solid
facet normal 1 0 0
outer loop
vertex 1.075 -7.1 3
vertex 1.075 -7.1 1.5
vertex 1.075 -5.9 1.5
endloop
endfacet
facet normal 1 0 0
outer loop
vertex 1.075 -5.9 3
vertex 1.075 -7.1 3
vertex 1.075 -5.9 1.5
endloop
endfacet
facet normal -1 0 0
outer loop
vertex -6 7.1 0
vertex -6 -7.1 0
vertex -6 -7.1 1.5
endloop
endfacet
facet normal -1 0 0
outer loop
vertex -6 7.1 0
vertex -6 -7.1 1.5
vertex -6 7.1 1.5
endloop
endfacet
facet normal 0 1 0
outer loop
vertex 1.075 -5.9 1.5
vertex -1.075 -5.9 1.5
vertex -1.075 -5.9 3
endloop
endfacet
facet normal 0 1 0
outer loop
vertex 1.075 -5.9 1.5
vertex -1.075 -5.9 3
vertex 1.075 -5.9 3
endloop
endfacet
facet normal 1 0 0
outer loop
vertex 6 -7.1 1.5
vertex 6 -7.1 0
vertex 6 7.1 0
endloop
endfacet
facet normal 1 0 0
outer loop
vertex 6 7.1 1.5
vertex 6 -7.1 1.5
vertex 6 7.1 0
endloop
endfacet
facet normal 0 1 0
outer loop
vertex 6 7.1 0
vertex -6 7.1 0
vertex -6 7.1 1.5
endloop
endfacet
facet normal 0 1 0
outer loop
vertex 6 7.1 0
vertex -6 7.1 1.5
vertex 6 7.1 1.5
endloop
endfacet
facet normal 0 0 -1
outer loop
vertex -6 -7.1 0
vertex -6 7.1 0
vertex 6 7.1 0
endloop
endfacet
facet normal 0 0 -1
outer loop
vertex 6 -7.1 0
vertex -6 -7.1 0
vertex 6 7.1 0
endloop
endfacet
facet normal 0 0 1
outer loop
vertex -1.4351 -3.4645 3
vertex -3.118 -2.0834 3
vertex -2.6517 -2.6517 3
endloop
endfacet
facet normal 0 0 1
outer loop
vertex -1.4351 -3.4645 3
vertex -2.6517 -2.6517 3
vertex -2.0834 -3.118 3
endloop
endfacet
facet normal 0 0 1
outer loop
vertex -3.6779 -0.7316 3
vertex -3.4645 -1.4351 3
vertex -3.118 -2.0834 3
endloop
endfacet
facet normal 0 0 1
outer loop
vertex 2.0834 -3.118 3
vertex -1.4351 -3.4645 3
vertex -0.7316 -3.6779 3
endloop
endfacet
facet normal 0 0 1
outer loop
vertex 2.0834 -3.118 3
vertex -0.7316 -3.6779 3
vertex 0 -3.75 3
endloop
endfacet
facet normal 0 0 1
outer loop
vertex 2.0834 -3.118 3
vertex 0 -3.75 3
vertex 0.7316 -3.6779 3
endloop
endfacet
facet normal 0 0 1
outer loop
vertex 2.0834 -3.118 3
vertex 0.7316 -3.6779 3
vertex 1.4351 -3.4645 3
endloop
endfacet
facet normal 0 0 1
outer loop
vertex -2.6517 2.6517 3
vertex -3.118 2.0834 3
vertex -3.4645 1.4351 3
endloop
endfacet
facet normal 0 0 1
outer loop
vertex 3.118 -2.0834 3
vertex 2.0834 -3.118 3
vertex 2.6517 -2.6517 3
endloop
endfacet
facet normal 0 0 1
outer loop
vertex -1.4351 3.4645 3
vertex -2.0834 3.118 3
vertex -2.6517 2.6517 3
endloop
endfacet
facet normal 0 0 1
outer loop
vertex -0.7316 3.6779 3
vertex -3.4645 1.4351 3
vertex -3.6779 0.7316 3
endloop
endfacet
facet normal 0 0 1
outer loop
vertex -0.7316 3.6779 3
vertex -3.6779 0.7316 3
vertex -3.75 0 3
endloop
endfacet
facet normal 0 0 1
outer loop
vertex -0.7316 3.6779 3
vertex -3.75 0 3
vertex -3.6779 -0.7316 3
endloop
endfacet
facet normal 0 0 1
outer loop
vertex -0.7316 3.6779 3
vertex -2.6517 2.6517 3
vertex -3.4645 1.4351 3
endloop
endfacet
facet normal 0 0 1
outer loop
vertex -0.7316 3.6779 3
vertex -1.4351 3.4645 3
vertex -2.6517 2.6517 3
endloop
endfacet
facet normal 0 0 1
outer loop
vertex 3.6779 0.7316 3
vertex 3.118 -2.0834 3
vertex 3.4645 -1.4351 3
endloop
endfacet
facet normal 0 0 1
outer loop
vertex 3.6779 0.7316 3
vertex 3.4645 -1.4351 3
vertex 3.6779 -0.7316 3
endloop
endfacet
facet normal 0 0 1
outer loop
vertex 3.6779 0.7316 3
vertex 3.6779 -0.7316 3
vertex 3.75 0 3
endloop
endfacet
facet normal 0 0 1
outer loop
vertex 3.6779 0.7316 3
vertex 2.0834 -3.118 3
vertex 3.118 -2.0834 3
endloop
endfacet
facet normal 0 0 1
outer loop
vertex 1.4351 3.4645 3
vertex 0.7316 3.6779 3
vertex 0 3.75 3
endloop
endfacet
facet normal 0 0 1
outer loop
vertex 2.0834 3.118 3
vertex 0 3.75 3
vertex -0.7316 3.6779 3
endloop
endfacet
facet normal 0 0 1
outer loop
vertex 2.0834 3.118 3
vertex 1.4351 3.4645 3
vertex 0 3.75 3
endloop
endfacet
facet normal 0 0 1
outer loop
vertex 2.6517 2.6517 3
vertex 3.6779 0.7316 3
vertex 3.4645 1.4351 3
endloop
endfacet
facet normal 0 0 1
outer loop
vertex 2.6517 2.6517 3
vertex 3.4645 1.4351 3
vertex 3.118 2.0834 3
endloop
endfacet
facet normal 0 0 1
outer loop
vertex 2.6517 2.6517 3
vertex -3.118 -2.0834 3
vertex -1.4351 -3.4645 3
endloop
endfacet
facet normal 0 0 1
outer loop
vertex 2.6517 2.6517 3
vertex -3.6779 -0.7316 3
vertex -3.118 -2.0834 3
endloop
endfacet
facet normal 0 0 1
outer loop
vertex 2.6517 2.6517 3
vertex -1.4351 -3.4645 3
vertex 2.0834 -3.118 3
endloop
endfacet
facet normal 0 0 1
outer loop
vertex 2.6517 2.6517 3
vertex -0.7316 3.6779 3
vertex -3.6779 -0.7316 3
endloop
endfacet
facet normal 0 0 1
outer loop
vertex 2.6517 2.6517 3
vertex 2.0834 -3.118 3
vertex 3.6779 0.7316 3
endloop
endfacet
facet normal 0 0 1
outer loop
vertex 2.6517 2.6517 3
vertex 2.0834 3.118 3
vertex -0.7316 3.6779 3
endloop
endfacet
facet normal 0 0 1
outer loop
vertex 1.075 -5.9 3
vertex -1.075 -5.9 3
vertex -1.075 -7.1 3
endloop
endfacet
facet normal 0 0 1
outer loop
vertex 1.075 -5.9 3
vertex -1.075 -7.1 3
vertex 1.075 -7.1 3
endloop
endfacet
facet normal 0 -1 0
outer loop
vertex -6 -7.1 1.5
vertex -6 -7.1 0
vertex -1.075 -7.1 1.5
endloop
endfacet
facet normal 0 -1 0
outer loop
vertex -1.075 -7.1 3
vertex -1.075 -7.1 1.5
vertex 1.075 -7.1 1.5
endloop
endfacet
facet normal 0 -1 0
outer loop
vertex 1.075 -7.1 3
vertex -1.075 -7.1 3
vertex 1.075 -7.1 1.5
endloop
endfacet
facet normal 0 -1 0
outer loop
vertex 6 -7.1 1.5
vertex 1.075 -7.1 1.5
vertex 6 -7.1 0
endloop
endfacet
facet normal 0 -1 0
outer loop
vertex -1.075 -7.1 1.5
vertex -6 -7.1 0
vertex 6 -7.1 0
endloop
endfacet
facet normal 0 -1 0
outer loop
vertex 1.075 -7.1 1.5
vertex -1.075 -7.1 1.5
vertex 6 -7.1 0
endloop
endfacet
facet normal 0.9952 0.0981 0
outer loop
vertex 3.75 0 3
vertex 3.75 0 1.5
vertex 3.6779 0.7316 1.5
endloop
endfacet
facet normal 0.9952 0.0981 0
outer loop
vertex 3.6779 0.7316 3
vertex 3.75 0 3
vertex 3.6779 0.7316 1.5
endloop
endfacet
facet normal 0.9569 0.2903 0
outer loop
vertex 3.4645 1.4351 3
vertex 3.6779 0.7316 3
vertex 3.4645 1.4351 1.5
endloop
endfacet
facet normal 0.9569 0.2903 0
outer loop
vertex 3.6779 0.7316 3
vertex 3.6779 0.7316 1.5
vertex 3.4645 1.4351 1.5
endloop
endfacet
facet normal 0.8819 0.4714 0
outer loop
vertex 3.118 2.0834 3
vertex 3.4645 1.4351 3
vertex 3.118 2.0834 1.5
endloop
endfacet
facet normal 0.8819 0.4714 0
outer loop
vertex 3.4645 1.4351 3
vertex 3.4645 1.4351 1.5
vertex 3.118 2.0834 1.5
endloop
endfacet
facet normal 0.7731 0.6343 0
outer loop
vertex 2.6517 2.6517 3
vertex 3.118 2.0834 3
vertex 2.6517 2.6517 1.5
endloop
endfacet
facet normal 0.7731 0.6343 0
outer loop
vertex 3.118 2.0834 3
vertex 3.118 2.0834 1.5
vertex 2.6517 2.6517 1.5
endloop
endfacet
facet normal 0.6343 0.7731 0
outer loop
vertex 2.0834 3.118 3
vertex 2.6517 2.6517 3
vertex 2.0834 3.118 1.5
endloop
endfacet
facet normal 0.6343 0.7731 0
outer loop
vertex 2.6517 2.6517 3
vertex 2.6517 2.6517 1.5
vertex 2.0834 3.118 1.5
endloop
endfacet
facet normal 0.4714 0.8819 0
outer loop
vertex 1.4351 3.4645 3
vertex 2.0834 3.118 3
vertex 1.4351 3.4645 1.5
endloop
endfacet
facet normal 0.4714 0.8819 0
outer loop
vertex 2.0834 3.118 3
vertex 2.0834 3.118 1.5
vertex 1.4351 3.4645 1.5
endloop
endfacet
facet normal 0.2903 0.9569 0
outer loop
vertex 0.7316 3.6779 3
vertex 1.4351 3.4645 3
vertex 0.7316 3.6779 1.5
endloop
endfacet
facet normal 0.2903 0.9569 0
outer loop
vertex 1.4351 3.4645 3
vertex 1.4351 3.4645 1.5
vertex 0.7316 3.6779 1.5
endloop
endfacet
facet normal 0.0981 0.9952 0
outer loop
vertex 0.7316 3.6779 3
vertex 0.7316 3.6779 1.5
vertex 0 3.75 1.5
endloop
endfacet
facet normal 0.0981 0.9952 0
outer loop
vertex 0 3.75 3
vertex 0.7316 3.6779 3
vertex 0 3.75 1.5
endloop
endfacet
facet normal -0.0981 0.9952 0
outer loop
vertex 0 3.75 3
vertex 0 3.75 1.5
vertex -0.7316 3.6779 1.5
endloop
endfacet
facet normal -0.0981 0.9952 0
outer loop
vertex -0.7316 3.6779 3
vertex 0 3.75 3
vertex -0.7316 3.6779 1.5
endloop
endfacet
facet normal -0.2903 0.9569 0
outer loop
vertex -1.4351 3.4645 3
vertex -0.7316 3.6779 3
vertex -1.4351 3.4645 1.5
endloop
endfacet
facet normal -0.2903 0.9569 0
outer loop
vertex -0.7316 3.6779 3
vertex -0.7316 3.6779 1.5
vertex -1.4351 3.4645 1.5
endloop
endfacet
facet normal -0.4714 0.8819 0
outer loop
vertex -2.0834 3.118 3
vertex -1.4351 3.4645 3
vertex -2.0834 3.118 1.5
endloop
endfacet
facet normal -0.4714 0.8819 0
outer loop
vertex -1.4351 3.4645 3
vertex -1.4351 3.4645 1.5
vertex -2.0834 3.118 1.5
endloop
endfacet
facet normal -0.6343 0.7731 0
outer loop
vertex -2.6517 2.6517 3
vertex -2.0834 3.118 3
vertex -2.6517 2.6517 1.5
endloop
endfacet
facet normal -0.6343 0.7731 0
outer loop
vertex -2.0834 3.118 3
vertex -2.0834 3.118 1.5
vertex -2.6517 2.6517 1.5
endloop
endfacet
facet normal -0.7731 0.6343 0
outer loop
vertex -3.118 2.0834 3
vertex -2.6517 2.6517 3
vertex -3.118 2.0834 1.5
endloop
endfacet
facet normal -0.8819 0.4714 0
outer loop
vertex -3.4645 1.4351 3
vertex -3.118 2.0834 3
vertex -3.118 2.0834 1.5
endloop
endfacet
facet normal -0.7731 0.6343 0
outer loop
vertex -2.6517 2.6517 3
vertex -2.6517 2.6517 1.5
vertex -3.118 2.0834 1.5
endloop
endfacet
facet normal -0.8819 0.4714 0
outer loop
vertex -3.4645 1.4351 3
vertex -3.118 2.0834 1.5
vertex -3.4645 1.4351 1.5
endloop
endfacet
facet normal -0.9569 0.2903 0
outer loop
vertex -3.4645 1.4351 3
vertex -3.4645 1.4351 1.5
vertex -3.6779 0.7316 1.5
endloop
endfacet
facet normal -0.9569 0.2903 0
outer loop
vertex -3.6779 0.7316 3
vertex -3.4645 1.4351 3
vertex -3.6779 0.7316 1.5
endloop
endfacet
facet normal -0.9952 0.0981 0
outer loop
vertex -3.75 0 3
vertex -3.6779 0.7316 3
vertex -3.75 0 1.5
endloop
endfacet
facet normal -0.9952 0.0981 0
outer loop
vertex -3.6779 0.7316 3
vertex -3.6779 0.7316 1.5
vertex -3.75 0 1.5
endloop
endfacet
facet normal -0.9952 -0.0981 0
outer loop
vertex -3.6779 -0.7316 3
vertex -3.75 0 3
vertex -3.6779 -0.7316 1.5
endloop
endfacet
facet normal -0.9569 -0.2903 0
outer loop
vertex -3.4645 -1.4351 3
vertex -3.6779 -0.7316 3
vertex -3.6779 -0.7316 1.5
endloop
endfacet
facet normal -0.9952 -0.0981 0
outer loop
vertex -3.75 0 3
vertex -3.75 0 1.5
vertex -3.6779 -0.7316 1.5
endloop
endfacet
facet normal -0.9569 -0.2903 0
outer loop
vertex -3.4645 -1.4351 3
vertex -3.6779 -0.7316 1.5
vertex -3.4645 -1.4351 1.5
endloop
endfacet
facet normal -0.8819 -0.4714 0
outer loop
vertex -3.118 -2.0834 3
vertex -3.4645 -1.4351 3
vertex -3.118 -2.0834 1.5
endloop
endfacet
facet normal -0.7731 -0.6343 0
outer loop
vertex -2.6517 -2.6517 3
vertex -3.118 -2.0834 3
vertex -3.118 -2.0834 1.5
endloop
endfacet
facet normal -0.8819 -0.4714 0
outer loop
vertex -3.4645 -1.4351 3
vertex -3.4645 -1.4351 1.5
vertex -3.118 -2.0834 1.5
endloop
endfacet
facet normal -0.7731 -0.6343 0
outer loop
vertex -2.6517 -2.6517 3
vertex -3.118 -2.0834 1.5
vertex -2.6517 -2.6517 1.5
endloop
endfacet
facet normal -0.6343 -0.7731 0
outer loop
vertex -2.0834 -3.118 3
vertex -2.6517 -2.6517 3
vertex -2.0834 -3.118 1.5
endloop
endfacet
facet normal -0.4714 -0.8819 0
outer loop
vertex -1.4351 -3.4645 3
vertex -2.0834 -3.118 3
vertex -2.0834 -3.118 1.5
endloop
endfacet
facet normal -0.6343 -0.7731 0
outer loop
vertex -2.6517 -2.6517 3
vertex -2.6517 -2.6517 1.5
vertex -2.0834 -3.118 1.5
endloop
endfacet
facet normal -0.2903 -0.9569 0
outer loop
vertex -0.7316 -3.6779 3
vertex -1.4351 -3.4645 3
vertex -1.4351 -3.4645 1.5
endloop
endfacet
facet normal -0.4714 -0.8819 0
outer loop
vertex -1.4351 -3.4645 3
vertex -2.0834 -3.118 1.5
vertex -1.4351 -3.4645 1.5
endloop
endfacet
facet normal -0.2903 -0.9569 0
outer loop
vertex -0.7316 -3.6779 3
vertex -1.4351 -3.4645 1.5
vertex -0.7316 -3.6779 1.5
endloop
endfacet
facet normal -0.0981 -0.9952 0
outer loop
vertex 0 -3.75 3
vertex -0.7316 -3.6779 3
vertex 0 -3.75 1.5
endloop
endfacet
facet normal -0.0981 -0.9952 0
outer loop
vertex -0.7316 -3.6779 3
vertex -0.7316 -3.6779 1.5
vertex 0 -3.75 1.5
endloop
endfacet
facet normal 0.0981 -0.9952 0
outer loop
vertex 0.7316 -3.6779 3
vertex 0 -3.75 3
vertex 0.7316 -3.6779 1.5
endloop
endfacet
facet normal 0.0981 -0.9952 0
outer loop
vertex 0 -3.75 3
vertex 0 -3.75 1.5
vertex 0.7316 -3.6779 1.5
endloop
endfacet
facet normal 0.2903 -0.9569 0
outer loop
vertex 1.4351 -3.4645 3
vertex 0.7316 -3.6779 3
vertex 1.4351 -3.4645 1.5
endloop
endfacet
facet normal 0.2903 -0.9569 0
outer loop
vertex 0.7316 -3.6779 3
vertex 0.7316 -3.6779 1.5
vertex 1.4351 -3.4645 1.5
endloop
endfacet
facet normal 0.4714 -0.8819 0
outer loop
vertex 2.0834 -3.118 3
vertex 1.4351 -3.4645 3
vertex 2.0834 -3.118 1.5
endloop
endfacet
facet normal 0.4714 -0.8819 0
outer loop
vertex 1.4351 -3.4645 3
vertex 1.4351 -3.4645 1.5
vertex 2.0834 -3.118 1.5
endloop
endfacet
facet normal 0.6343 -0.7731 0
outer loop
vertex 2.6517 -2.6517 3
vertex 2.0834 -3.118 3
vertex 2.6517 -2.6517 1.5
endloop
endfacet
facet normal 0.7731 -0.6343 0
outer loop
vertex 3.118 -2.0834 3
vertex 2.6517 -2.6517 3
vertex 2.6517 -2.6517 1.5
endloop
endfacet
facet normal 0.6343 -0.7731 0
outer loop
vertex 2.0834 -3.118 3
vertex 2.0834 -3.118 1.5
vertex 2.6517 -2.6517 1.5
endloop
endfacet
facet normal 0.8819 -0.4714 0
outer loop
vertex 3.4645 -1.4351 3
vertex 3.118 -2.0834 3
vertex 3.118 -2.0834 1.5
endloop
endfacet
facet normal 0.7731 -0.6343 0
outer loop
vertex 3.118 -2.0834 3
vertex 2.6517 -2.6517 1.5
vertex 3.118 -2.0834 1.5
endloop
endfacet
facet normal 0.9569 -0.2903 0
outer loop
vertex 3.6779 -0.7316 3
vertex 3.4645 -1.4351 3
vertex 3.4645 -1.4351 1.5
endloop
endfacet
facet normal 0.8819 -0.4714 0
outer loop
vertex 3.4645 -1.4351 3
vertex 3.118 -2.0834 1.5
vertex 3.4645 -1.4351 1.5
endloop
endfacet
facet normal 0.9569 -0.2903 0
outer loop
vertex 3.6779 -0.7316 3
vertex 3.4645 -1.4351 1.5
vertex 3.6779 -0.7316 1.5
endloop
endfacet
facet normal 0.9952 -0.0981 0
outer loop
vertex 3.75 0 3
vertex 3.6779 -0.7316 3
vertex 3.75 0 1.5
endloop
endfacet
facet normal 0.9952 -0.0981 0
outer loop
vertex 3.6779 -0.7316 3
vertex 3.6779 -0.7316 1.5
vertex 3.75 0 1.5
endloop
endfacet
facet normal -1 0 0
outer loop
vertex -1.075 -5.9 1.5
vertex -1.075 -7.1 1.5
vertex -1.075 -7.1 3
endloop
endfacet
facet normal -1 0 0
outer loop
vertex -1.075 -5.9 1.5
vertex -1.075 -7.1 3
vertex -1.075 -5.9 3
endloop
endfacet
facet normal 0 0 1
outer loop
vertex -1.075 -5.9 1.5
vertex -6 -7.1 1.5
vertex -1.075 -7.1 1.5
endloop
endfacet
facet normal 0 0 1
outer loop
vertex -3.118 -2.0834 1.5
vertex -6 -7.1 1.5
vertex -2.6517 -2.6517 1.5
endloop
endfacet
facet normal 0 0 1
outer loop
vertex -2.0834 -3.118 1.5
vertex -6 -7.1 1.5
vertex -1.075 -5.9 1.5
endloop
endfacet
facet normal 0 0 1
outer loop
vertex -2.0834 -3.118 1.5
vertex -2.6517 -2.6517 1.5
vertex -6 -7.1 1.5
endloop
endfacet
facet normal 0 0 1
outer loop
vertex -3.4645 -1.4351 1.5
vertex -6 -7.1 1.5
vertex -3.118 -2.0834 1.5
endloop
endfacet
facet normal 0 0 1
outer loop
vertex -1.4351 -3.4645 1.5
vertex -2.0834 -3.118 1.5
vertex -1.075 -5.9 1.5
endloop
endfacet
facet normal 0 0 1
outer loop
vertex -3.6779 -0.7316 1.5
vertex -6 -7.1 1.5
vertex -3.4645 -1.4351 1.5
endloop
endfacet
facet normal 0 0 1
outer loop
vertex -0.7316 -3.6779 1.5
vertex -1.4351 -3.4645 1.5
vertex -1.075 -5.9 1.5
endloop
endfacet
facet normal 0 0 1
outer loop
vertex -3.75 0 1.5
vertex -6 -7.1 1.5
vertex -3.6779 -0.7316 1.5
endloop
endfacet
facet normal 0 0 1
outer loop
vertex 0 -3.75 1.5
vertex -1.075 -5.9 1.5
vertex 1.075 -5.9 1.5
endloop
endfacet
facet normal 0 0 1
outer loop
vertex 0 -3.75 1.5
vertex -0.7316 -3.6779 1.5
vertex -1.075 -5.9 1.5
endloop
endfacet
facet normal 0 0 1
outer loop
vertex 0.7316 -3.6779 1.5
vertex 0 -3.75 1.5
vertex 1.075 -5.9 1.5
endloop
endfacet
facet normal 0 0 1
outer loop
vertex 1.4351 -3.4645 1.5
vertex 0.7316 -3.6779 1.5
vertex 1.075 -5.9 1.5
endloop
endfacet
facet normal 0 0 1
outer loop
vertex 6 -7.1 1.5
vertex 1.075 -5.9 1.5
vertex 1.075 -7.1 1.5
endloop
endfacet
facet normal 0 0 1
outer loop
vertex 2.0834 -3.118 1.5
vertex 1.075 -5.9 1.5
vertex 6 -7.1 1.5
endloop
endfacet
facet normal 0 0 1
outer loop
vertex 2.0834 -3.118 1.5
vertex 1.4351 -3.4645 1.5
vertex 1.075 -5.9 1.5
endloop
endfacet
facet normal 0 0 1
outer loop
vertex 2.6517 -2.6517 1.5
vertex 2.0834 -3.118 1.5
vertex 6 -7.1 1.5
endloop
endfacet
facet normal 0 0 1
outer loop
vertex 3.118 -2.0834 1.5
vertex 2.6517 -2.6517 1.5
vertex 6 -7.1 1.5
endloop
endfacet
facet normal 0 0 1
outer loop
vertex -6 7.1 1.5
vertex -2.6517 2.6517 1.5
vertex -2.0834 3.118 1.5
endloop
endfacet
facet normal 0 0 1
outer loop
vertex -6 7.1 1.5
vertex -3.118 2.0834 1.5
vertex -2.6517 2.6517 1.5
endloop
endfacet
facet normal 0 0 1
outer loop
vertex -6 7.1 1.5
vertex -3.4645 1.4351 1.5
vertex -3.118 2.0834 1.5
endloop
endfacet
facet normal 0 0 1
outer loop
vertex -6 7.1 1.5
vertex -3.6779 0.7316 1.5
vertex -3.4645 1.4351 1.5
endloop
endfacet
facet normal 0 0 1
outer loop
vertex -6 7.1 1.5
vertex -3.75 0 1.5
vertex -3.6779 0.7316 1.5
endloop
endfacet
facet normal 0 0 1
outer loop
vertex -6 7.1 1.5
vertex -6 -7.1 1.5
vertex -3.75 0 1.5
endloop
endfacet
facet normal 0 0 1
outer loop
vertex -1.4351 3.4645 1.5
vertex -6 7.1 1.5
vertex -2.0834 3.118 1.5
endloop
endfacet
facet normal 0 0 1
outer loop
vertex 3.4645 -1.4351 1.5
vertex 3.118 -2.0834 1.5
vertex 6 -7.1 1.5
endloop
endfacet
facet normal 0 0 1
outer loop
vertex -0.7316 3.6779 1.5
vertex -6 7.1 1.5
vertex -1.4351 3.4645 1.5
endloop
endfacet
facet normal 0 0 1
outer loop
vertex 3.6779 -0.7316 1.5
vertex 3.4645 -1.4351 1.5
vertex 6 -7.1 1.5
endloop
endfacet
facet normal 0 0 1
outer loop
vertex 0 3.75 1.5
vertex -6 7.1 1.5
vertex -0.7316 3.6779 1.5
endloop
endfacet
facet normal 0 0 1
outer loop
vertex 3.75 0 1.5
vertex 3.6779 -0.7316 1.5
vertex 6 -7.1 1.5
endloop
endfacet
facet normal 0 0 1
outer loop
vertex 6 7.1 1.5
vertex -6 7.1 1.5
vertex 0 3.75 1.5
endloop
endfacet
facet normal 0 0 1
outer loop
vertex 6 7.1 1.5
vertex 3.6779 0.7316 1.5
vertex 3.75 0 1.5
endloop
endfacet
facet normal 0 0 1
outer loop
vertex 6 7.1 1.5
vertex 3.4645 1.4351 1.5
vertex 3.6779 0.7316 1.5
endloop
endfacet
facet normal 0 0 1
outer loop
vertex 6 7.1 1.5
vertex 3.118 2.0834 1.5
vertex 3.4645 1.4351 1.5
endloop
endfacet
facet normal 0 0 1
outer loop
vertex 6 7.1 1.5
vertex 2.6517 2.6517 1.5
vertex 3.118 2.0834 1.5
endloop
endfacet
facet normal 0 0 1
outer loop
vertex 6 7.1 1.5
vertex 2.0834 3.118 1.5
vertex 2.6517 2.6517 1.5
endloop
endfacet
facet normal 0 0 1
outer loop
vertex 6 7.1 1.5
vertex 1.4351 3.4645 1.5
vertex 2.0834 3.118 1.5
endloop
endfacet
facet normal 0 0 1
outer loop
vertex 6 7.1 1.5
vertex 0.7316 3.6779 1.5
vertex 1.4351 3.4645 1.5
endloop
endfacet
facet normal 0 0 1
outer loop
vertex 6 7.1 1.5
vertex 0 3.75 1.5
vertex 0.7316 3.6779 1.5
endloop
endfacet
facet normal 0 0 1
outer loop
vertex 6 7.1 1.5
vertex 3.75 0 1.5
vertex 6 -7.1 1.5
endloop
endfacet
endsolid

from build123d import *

# Parameters (mm, degrees)
SKETCH_W     = 12
SKETCH_H     = 14.2
PAD_DEPTH    = 1.5
SKETCH003_R  = 3.75
PAD003_DEPTH = 1.5
SKETCH004_W  = 2.15
SKETCH004_H  = 1.2
PAD004_DEPTH = 1.5


with BuildPart() as part:
    # Sketch → Pad (new body)
    with BuildSketch(Plane.XY):
        Rectangle(SKETCH_W, SKETCH_H)
    extrude(amount=PAD_DEPTH)

    # Sketch003 (on Face6 of Pad) → Pad003 (join)
    with BuildSketch(Plane.XY.offset(1.5)):
        Circle(SKETCH003_R)
    extrude(amount=PAD003_DEPTH)

    # Sketch004 (on Face5 of Pad003) → Pad004 (join)
    with BuildSketch(Plane.XY.offset(1.5)):
        with Locations((0, -6.5)):
            Rectangle(SKETCH004_W, SKETCH004_H)
    extrude(amount=PAD004_DEPTH)


solid = part.part
